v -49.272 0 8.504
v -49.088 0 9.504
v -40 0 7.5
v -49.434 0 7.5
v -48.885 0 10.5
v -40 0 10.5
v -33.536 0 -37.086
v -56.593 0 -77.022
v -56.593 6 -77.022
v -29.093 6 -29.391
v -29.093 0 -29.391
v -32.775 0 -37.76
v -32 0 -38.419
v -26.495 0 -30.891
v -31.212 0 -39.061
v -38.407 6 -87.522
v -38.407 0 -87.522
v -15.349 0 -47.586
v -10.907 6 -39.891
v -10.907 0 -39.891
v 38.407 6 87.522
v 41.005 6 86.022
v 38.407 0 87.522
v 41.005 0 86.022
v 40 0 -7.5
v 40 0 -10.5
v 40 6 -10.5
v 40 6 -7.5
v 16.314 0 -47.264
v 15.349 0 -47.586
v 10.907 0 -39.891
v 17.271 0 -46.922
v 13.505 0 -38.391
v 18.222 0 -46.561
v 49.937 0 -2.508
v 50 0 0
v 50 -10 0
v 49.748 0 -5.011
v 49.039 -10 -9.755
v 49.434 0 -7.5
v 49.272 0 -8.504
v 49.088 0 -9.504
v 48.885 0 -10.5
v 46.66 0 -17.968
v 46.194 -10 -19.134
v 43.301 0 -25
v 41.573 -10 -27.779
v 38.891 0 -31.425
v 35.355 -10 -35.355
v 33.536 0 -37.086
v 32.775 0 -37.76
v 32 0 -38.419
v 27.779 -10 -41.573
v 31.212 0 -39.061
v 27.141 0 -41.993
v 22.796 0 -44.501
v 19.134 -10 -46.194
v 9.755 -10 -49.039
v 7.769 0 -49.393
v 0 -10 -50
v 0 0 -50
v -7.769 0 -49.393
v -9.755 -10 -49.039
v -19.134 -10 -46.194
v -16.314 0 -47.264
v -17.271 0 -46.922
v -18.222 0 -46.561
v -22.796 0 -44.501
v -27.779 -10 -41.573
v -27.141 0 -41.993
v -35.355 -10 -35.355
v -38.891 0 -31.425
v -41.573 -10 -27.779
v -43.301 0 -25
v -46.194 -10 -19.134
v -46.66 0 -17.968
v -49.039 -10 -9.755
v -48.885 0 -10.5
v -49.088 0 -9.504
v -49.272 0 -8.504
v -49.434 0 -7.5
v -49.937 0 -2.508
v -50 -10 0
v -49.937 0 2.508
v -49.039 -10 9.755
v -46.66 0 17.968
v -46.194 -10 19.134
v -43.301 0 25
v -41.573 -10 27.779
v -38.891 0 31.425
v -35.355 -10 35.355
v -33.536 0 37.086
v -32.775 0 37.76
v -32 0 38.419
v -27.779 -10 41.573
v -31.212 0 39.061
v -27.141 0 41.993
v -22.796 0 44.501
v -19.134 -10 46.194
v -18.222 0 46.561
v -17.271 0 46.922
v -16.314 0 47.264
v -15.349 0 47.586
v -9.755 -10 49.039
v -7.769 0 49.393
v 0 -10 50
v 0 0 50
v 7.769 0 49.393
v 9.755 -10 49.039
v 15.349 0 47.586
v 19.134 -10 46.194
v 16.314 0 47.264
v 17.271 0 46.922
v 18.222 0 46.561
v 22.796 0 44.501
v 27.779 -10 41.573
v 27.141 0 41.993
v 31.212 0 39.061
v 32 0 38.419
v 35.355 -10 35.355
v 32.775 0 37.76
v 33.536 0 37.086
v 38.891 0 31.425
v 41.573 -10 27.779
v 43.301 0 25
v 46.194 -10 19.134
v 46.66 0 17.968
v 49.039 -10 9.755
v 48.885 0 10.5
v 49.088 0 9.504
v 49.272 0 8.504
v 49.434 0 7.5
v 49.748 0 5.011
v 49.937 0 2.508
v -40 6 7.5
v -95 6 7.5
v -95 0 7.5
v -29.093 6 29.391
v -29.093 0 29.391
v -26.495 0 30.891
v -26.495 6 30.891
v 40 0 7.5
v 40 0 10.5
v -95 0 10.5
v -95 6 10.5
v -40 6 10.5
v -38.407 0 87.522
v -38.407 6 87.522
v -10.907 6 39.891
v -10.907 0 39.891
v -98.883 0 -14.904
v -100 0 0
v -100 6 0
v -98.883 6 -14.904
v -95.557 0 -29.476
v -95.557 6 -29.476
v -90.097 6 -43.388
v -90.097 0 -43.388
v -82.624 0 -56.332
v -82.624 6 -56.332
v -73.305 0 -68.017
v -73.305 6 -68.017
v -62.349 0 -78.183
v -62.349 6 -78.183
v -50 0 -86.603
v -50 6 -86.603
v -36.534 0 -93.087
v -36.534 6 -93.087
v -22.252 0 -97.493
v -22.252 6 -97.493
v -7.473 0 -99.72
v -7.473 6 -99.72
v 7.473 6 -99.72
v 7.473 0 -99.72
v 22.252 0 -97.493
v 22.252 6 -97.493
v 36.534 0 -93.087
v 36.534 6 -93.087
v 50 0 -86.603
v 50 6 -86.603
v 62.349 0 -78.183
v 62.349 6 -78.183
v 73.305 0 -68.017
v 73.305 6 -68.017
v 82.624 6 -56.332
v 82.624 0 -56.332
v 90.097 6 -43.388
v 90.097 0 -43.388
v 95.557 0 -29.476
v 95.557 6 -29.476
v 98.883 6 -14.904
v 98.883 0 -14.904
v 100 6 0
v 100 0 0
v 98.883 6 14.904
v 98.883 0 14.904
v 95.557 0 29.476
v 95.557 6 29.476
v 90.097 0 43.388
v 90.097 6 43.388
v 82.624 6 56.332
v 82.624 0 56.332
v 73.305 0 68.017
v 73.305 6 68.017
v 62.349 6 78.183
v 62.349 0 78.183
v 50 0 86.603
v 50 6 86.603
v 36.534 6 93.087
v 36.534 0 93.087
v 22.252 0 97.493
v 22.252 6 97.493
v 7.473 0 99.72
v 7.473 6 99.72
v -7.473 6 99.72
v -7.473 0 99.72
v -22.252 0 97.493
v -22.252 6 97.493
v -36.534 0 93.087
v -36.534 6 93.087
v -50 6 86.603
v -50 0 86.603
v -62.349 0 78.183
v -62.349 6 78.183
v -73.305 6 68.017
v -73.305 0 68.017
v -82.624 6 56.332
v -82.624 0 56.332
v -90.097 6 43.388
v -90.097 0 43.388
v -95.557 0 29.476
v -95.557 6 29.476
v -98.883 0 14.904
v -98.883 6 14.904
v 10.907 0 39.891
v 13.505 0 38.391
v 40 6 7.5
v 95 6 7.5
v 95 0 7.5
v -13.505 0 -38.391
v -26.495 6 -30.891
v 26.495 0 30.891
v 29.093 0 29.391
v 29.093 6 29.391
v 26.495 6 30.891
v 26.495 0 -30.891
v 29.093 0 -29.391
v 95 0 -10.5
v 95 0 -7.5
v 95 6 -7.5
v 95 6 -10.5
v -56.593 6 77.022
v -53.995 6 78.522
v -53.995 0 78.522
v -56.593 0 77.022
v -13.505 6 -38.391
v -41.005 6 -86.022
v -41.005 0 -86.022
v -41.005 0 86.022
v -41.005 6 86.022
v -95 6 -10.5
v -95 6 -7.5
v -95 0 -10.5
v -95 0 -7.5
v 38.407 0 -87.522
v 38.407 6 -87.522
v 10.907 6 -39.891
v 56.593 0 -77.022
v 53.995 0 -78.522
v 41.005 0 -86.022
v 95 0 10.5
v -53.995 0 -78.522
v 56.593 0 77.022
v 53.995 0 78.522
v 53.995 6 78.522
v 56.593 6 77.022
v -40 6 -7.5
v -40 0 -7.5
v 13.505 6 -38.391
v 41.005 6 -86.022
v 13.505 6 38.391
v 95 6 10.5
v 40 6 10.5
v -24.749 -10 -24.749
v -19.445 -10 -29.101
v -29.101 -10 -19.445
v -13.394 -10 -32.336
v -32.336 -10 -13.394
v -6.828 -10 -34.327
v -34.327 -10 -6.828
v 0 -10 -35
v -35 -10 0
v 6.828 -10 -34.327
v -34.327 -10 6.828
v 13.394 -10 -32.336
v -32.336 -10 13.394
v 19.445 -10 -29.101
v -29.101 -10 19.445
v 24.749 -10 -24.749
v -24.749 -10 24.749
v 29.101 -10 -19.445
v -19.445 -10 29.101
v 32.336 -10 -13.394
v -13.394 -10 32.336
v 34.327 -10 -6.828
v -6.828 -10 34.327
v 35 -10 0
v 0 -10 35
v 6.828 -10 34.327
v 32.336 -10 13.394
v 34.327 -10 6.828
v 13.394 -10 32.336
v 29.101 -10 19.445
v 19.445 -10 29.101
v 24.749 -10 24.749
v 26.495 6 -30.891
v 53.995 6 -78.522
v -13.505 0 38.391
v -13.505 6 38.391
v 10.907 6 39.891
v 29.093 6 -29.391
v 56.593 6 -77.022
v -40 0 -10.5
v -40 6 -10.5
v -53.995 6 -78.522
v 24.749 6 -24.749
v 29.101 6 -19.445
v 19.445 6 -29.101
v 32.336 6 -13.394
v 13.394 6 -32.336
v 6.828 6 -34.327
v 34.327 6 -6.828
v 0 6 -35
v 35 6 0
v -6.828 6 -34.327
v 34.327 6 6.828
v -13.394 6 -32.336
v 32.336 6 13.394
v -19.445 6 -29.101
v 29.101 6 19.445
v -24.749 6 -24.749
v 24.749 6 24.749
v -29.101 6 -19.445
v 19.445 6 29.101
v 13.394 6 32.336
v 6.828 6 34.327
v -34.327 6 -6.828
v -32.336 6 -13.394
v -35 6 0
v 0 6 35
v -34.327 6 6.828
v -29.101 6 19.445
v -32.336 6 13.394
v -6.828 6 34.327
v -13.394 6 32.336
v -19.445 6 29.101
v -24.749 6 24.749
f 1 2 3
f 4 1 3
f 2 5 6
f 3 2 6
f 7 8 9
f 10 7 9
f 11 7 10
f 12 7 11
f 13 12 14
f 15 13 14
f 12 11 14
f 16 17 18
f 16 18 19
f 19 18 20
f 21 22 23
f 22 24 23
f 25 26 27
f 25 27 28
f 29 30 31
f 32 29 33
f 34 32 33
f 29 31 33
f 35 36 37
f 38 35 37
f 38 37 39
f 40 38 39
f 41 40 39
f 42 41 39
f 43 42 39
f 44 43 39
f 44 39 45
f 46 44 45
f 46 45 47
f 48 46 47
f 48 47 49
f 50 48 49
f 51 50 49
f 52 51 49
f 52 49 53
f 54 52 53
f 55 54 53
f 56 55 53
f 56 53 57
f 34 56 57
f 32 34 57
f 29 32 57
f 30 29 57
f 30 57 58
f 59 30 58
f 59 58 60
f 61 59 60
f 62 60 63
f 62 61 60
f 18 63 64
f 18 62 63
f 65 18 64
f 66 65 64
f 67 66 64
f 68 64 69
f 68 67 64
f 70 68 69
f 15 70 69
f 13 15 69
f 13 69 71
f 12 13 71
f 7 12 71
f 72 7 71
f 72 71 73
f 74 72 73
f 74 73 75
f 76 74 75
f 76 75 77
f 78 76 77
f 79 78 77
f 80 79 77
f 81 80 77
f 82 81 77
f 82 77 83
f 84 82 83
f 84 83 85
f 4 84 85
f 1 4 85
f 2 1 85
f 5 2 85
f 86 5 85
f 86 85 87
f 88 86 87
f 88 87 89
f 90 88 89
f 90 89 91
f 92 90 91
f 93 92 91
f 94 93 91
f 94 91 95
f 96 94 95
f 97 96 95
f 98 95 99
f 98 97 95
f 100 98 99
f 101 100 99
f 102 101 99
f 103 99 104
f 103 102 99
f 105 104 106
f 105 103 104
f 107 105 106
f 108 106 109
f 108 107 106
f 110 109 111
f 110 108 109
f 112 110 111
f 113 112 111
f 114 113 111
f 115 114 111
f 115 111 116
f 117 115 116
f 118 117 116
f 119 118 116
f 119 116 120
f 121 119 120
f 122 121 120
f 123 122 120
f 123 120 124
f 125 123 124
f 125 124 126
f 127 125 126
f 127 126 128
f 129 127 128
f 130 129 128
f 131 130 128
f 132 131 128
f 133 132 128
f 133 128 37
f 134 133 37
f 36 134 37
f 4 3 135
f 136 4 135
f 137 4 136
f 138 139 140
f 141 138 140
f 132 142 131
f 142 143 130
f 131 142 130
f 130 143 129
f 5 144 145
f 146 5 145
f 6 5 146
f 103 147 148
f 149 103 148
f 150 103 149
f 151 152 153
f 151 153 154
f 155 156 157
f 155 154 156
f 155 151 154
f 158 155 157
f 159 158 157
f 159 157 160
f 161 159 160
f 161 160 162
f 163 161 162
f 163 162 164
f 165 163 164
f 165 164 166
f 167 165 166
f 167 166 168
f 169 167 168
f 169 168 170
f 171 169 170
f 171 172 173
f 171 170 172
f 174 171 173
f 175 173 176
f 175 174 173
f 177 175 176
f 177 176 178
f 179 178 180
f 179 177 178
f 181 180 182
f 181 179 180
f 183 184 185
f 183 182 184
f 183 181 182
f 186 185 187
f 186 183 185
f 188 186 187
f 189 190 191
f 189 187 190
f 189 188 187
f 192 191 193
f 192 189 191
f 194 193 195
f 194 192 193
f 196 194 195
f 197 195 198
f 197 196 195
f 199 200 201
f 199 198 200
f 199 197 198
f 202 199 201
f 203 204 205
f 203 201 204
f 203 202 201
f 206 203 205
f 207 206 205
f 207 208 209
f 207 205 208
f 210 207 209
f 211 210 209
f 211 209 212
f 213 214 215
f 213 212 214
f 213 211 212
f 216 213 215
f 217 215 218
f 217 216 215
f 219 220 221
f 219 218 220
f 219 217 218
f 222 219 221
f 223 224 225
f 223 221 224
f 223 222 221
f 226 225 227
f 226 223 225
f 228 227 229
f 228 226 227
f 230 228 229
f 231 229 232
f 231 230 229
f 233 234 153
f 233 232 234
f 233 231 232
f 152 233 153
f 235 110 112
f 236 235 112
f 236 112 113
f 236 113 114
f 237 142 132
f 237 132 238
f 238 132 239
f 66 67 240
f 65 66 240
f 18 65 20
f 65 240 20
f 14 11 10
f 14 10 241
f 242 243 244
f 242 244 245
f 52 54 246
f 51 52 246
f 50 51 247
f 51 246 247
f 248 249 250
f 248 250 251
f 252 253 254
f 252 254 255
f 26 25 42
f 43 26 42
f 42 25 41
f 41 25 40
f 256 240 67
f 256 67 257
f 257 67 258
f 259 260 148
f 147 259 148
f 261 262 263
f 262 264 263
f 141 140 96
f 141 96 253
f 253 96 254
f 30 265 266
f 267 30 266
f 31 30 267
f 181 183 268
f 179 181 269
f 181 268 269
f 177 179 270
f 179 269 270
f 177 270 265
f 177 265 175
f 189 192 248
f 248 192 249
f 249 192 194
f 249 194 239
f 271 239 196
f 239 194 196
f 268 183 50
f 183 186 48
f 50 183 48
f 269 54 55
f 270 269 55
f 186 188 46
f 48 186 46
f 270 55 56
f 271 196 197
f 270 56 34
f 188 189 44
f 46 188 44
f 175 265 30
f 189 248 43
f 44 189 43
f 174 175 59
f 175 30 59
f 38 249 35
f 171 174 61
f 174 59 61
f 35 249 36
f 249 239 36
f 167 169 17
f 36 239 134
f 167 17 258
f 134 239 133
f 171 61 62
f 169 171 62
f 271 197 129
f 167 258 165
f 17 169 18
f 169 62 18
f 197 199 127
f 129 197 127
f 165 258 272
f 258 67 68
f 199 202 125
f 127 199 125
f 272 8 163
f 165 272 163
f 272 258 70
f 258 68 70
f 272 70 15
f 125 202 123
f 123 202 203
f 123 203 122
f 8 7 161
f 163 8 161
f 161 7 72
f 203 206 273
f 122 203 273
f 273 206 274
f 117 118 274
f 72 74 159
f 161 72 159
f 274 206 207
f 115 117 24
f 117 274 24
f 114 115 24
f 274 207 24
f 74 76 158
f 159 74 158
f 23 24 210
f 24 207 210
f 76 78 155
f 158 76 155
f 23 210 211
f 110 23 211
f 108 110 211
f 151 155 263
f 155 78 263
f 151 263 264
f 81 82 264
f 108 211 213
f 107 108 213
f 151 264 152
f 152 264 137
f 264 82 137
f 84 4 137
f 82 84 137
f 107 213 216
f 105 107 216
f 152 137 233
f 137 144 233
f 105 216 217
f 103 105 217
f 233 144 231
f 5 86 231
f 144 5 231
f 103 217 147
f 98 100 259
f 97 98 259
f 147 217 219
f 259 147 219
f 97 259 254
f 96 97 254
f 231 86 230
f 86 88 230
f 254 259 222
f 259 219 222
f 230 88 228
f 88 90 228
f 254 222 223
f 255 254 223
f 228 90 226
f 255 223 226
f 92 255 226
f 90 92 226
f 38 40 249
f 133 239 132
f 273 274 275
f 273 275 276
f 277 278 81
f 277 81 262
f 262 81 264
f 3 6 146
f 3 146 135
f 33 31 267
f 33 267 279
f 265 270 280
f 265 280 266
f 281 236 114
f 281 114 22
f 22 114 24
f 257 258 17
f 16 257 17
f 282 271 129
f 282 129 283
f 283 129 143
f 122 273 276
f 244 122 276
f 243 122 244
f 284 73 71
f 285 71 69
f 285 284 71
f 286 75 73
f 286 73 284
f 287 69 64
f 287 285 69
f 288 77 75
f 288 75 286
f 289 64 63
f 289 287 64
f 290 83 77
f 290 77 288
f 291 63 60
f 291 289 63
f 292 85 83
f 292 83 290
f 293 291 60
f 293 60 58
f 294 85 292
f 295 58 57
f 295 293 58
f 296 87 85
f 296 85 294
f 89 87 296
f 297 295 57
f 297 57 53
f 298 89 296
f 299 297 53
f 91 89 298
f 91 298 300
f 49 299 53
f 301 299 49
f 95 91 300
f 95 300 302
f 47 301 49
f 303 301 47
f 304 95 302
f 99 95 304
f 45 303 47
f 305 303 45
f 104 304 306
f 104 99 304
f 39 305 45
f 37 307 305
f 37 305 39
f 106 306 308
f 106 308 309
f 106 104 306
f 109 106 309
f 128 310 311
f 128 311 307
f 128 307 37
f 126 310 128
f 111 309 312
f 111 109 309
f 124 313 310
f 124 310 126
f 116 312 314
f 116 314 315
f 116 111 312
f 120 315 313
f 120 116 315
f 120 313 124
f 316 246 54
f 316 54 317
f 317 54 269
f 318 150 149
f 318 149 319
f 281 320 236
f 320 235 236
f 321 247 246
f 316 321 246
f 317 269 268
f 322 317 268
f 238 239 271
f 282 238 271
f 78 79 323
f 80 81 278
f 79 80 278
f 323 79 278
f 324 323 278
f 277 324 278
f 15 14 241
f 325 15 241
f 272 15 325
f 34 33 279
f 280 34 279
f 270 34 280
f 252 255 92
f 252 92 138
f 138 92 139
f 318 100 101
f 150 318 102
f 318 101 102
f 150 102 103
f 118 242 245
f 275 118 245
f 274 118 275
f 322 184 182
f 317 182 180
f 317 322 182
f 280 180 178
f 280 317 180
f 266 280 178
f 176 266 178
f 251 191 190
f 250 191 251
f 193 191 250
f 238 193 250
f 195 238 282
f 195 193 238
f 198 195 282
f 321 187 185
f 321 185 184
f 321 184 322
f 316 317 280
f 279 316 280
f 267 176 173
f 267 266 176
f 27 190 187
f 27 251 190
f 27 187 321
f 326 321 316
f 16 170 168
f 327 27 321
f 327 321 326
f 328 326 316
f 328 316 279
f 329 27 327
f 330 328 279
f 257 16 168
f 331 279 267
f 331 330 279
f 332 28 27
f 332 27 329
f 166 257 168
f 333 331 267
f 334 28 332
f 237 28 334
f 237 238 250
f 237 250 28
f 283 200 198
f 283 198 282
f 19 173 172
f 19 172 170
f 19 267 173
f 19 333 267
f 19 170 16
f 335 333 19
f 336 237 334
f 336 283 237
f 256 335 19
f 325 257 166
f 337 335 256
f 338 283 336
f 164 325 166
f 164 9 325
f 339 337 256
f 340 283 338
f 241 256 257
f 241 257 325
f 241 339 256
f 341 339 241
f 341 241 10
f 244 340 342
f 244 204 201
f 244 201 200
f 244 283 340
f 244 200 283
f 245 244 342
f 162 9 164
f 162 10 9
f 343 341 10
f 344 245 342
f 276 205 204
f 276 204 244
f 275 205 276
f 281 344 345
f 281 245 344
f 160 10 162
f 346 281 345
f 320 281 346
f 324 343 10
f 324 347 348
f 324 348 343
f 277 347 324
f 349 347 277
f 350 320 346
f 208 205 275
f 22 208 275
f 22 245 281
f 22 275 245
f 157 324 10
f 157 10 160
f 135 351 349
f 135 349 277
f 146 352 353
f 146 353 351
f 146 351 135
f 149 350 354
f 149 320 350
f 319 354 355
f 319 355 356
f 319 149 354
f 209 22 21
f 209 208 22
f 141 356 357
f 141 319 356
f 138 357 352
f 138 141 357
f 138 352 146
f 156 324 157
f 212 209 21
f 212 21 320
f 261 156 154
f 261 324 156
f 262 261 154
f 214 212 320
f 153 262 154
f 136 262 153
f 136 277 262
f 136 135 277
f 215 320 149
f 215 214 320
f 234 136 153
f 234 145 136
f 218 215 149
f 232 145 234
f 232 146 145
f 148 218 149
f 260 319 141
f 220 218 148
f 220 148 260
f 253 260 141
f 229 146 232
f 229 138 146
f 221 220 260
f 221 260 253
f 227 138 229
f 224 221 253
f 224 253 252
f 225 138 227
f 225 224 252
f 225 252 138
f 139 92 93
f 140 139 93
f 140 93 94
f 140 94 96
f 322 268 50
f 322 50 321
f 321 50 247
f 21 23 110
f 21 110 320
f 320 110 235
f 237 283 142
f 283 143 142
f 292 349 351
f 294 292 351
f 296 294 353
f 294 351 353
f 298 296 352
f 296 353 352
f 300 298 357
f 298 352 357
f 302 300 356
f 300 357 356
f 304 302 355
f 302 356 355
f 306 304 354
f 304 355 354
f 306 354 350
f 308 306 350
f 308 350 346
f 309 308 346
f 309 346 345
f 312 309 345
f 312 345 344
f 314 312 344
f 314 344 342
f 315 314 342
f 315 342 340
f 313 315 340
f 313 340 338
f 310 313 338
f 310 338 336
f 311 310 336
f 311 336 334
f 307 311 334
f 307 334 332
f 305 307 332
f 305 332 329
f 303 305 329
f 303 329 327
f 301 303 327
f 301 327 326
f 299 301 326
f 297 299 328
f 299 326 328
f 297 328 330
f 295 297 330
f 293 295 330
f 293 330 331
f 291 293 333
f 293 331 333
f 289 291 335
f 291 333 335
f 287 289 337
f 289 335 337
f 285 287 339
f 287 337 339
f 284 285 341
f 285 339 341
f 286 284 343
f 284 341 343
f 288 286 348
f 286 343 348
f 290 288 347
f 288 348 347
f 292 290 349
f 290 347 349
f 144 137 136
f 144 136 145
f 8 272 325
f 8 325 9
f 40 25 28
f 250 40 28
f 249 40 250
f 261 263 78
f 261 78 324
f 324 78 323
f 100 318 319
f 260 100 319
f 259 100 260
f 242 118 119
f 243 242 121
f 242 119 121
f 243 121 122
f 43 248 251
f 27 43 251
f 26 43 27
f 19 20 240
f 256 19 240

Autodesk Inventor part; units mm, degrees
ref_plane "YZ Plane" through (0, 0, 0) normal (1, 0, 0) x (0, 1, 0)
ref_plane "XZ Plane" through (0, 0, 0) normal (0, 1, 0) x (-1, 0, 0)
ref_plane "XY Plane" through (0, 0, 0) normal (0, 0, 1) x (1, 0, 0)
sketch "Sketch1" plane through (0, 0, 0) normal (0, 1, 0) x (-1, 0, 0)
  line L0 (0, 30.3953) -> (0, -28.0277)
  circle A0 centre (0, 0) radius 100
  line L1 (95, 10.5) -> (40, 10.5)
  line L2 (40, 10.5) -> (40, 7.5)
  line L3 (40, 7.5) -> (95, 7.5)
  line L4 (95, 7.5) -> (95, 10.5)
  line L5 (95, -10.5) -> (40, -10.5)
  line L6 (40, -10.5) -> (40, -7.5)
  line L7 (40, -7.5) -> (95, -7.5)
  line L8 (95, -7.5) -> (95, -10.5)
  line L9 (0, 0) -> (75.0694, 0)
  line L10 (0, 0) -> (37.5347, 65.012)
  line L11 (0, 0) -> (-37.5347, 65.012)
  line L12 (0, 0) -> (-75.0694, 0)
  line L13 (0, 0) -> (-37.5347, -65.012)
  line L14 (0, 0) -> (37.5347, -65.012)
  circle A1 centre (0, 0) radius 35
  point P0 (20, 0)
  point P1 (10, 17.3205)
  point P2 (-10, 17.3205)
  point P3 (-20, 0)
  point P4 (-10, -17.3205)
  point P5 (10, -17.3205)
  dimension "d0" = 200
  dimension "t" = 3
  dimension "d2" = 55
  dimension "d3" = 40
  dimension "d4" = 15
  dimension "d21" = 360
  dimension "d27" = 70
extrude "Extrusion1" add sketch "Sketch1" along normal blind 6 contours A0 | L4 L3 L2 L1 | L5 L6 L7 L8 | L10 A1 L9 | L11 A1 L10 | L12 A1 L11 | L13 A1 L12 | L14 A1 L13 | L9 A1 L14
extrude "Extrusion3" cut sketch "Sketch1" along normal through all contours L4 L3 L2 L1 | L5 L6 L7 L8
pattern_circular "Circular Pattern1" count 6 over 360 about axis through (0, 0, 0) along (0, 1, 0) of "Extrusion3"
extrude "Extrusion5" cut sketch "Sketch1" along normal through all contours L10 A1 L9 | L11 A1 L10 | L12 A1 L11 | L13 A1 L12 | L14 A1 L13 | L9 A1 L14
sketch "Sketch2" plane through (0, 0, 0) normal (0, -1, 0) x (1, 0, 0)
  circle A0 centre (0, 0) radius 50
  dimension "d30" = 100
extrude "Extrusion6" add sketch "Sketch2" along normal blind 10
extrude "Extrusion7" cut sketch "Sketch1" against normal through all contours L10 A1 L9 | L11 A1 L10 | L12 A1 L11 | L13 A1 L12 | L14 A1 L13 | L9 A1 L14
equation "\"d5\" = 2 * t"
equation "\"d9\" = t"
equation "\"d28\" = t"
properties part number "rotor"
